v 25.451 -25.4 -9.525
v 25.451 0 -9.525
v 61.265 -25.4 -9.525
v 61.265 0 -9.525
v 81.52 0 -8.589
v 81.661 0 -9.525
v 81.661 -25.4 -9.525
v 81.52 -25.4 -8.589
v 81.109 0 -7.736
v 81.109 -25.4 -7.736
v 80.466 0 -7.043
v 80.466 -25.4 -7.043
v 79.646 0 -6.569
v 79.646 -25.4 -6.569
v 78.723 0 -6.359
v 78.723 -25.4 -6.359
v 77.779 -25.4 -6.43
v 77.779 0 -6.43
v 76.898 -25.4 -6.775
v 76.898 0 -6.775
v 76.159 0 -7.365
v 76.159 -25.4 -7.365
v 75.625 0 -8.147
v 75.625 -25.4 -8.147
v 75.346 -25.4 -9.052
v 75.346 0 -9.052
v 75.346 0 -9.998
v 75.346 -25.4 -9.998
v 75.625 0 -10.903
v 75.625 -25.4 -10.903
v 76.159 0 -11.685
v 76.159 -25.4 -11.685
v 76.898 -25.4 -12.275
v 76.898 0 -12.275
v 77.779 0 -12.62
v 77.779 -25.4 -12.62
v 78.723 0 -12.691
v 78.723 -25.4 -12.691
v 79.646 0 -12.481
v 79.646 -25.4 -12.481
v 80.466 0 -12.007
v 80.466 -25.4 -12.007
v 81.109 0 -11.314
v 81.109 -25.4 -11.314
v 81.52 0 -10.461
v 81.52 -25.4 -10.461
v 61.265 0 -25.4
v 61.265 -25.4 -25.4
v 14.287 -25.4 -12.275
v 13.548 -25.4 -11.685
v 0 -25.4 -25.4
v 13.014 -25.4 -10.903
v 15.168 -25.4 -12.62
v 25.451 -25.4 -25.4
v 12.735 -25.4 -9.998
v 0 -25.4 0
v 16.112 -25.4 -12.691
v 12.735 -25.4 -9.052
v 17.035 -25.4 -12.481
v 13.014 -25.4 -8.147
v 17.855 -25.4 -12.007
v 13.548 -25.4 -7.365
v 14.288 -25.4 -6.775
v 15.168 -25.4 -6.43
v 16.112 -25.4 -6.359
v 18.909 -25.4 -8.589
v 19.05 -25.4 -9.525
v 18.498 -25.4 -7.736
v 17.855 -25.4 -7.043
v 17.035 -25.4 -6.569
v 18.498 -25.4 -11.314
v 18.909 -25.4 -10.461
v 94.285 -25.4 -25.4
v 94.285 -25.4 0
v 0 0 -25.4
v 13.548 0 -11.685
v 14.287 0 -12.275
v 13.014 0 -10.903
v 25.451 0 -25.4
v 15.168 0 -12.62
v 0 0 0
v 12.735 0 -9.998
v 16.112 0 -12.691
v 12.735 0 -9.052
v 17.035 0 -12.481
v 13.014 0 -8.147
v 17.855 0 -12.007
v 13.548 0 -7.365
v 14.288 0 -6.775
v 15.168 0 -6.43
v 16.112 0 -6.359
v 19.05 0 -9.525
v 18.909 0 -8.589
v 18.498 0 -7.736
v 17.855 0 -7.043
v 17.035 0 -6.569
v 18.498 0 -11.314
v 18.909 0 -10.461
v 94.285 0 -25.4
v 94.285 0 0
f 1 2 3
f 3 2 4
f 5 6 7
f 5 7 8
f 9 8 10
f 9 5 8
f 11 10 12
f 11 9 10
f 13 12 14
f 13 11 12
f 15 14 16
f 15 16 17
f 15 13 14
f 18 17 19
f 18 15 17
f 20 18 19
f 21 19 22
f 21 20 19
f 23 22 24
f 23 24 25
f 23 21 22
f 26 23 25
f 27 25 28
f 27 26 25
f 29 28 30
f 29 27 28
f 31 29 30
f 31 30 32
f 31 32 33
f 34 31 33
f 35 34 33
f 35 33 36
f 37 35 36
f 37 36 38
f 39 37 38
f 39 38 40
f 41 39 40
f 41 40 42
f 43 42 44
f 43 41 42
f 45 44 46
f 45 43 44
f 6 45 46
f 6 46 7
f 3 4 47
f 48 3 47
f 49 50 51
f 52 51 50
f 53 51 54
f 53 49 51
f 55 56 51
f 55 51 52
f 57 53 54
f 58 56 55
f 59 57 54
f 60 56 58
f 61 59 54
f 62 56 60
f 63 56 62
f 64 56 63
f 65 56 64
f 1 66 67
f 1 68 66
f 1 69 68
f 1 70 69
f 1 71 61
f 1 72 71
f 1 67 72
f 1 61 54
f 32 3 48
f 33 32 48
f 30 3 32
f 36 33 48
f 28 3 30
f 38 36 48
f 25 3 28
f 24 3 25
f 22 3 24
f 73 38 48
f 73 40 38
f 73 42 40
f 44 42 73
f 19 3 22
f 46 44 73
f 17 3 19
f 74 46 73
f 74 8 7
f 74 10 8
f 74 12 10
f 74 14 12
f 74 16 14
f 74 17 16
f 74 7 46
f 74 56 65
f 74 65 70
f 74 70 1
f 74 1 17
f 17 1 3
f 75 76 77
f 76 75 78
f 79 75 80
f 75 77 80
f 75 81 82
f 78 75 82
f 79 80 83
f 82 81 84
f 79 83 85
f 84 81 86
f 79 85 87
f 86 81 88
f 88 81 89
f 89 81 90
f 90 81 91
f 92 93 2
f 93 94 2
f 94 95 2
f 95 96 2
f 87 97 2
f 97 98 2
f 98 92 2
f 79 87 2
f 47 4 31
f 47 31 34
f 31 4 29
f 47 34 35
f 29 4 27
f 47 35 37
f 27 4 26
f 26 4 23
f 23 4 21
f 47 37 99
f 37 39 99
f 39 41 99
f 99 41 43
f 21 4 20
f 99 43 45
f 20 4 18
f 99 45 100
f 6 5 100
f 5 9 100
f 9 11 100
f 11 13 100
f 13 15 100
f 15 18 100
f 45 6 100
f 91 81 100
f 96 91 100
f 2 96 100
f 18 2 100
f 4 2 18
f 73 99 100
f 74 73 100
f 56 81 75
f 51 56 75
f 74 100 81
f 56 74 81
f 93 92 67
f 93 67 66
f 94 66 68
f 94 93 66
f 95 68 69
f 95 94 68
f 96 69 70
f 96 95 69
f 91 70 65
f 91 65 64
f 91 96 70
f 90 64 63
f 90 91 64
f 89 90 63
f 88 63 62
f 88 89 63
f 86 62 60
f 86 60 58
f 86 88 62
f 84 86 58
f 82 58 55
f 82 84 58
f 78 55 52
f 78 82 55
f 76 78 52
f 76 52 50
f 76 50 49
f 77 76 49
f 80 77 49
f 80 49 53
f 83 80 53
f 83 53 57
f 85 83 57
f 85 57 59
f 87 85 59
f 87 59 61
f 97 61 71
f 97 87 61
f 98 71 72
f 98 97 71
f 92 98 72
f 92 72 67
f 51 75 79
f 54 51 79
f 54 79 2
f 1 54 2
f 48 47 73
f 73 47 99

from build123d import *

# Parameters (mm, degrees)
F0_R     = 3.175
F1_DEPTH = 25.4


with BuildPart() as f1:
    # F0 (on Front) → F1 (new body)
    with BuildSketch(Plane.XZ):
        Polygon((94.2848, 0), (0, 0), (0, -25.4), (25.4508, -25.4), (25.4508, -9.525), (61.2648, -9.525), (61.2648, -25.4), (94.2848, -25.4), align=None)
        with Locations((15.875, -9.525)):
            Circle(F0_R, mode=Mode.SUBTRACT)
        with Locations((78.486, -9.525)):
            Circle(F0_R, mode=Mode.SUBTRACT)
    extrude(amount=F1_DEPTH)


solid = f1.part
